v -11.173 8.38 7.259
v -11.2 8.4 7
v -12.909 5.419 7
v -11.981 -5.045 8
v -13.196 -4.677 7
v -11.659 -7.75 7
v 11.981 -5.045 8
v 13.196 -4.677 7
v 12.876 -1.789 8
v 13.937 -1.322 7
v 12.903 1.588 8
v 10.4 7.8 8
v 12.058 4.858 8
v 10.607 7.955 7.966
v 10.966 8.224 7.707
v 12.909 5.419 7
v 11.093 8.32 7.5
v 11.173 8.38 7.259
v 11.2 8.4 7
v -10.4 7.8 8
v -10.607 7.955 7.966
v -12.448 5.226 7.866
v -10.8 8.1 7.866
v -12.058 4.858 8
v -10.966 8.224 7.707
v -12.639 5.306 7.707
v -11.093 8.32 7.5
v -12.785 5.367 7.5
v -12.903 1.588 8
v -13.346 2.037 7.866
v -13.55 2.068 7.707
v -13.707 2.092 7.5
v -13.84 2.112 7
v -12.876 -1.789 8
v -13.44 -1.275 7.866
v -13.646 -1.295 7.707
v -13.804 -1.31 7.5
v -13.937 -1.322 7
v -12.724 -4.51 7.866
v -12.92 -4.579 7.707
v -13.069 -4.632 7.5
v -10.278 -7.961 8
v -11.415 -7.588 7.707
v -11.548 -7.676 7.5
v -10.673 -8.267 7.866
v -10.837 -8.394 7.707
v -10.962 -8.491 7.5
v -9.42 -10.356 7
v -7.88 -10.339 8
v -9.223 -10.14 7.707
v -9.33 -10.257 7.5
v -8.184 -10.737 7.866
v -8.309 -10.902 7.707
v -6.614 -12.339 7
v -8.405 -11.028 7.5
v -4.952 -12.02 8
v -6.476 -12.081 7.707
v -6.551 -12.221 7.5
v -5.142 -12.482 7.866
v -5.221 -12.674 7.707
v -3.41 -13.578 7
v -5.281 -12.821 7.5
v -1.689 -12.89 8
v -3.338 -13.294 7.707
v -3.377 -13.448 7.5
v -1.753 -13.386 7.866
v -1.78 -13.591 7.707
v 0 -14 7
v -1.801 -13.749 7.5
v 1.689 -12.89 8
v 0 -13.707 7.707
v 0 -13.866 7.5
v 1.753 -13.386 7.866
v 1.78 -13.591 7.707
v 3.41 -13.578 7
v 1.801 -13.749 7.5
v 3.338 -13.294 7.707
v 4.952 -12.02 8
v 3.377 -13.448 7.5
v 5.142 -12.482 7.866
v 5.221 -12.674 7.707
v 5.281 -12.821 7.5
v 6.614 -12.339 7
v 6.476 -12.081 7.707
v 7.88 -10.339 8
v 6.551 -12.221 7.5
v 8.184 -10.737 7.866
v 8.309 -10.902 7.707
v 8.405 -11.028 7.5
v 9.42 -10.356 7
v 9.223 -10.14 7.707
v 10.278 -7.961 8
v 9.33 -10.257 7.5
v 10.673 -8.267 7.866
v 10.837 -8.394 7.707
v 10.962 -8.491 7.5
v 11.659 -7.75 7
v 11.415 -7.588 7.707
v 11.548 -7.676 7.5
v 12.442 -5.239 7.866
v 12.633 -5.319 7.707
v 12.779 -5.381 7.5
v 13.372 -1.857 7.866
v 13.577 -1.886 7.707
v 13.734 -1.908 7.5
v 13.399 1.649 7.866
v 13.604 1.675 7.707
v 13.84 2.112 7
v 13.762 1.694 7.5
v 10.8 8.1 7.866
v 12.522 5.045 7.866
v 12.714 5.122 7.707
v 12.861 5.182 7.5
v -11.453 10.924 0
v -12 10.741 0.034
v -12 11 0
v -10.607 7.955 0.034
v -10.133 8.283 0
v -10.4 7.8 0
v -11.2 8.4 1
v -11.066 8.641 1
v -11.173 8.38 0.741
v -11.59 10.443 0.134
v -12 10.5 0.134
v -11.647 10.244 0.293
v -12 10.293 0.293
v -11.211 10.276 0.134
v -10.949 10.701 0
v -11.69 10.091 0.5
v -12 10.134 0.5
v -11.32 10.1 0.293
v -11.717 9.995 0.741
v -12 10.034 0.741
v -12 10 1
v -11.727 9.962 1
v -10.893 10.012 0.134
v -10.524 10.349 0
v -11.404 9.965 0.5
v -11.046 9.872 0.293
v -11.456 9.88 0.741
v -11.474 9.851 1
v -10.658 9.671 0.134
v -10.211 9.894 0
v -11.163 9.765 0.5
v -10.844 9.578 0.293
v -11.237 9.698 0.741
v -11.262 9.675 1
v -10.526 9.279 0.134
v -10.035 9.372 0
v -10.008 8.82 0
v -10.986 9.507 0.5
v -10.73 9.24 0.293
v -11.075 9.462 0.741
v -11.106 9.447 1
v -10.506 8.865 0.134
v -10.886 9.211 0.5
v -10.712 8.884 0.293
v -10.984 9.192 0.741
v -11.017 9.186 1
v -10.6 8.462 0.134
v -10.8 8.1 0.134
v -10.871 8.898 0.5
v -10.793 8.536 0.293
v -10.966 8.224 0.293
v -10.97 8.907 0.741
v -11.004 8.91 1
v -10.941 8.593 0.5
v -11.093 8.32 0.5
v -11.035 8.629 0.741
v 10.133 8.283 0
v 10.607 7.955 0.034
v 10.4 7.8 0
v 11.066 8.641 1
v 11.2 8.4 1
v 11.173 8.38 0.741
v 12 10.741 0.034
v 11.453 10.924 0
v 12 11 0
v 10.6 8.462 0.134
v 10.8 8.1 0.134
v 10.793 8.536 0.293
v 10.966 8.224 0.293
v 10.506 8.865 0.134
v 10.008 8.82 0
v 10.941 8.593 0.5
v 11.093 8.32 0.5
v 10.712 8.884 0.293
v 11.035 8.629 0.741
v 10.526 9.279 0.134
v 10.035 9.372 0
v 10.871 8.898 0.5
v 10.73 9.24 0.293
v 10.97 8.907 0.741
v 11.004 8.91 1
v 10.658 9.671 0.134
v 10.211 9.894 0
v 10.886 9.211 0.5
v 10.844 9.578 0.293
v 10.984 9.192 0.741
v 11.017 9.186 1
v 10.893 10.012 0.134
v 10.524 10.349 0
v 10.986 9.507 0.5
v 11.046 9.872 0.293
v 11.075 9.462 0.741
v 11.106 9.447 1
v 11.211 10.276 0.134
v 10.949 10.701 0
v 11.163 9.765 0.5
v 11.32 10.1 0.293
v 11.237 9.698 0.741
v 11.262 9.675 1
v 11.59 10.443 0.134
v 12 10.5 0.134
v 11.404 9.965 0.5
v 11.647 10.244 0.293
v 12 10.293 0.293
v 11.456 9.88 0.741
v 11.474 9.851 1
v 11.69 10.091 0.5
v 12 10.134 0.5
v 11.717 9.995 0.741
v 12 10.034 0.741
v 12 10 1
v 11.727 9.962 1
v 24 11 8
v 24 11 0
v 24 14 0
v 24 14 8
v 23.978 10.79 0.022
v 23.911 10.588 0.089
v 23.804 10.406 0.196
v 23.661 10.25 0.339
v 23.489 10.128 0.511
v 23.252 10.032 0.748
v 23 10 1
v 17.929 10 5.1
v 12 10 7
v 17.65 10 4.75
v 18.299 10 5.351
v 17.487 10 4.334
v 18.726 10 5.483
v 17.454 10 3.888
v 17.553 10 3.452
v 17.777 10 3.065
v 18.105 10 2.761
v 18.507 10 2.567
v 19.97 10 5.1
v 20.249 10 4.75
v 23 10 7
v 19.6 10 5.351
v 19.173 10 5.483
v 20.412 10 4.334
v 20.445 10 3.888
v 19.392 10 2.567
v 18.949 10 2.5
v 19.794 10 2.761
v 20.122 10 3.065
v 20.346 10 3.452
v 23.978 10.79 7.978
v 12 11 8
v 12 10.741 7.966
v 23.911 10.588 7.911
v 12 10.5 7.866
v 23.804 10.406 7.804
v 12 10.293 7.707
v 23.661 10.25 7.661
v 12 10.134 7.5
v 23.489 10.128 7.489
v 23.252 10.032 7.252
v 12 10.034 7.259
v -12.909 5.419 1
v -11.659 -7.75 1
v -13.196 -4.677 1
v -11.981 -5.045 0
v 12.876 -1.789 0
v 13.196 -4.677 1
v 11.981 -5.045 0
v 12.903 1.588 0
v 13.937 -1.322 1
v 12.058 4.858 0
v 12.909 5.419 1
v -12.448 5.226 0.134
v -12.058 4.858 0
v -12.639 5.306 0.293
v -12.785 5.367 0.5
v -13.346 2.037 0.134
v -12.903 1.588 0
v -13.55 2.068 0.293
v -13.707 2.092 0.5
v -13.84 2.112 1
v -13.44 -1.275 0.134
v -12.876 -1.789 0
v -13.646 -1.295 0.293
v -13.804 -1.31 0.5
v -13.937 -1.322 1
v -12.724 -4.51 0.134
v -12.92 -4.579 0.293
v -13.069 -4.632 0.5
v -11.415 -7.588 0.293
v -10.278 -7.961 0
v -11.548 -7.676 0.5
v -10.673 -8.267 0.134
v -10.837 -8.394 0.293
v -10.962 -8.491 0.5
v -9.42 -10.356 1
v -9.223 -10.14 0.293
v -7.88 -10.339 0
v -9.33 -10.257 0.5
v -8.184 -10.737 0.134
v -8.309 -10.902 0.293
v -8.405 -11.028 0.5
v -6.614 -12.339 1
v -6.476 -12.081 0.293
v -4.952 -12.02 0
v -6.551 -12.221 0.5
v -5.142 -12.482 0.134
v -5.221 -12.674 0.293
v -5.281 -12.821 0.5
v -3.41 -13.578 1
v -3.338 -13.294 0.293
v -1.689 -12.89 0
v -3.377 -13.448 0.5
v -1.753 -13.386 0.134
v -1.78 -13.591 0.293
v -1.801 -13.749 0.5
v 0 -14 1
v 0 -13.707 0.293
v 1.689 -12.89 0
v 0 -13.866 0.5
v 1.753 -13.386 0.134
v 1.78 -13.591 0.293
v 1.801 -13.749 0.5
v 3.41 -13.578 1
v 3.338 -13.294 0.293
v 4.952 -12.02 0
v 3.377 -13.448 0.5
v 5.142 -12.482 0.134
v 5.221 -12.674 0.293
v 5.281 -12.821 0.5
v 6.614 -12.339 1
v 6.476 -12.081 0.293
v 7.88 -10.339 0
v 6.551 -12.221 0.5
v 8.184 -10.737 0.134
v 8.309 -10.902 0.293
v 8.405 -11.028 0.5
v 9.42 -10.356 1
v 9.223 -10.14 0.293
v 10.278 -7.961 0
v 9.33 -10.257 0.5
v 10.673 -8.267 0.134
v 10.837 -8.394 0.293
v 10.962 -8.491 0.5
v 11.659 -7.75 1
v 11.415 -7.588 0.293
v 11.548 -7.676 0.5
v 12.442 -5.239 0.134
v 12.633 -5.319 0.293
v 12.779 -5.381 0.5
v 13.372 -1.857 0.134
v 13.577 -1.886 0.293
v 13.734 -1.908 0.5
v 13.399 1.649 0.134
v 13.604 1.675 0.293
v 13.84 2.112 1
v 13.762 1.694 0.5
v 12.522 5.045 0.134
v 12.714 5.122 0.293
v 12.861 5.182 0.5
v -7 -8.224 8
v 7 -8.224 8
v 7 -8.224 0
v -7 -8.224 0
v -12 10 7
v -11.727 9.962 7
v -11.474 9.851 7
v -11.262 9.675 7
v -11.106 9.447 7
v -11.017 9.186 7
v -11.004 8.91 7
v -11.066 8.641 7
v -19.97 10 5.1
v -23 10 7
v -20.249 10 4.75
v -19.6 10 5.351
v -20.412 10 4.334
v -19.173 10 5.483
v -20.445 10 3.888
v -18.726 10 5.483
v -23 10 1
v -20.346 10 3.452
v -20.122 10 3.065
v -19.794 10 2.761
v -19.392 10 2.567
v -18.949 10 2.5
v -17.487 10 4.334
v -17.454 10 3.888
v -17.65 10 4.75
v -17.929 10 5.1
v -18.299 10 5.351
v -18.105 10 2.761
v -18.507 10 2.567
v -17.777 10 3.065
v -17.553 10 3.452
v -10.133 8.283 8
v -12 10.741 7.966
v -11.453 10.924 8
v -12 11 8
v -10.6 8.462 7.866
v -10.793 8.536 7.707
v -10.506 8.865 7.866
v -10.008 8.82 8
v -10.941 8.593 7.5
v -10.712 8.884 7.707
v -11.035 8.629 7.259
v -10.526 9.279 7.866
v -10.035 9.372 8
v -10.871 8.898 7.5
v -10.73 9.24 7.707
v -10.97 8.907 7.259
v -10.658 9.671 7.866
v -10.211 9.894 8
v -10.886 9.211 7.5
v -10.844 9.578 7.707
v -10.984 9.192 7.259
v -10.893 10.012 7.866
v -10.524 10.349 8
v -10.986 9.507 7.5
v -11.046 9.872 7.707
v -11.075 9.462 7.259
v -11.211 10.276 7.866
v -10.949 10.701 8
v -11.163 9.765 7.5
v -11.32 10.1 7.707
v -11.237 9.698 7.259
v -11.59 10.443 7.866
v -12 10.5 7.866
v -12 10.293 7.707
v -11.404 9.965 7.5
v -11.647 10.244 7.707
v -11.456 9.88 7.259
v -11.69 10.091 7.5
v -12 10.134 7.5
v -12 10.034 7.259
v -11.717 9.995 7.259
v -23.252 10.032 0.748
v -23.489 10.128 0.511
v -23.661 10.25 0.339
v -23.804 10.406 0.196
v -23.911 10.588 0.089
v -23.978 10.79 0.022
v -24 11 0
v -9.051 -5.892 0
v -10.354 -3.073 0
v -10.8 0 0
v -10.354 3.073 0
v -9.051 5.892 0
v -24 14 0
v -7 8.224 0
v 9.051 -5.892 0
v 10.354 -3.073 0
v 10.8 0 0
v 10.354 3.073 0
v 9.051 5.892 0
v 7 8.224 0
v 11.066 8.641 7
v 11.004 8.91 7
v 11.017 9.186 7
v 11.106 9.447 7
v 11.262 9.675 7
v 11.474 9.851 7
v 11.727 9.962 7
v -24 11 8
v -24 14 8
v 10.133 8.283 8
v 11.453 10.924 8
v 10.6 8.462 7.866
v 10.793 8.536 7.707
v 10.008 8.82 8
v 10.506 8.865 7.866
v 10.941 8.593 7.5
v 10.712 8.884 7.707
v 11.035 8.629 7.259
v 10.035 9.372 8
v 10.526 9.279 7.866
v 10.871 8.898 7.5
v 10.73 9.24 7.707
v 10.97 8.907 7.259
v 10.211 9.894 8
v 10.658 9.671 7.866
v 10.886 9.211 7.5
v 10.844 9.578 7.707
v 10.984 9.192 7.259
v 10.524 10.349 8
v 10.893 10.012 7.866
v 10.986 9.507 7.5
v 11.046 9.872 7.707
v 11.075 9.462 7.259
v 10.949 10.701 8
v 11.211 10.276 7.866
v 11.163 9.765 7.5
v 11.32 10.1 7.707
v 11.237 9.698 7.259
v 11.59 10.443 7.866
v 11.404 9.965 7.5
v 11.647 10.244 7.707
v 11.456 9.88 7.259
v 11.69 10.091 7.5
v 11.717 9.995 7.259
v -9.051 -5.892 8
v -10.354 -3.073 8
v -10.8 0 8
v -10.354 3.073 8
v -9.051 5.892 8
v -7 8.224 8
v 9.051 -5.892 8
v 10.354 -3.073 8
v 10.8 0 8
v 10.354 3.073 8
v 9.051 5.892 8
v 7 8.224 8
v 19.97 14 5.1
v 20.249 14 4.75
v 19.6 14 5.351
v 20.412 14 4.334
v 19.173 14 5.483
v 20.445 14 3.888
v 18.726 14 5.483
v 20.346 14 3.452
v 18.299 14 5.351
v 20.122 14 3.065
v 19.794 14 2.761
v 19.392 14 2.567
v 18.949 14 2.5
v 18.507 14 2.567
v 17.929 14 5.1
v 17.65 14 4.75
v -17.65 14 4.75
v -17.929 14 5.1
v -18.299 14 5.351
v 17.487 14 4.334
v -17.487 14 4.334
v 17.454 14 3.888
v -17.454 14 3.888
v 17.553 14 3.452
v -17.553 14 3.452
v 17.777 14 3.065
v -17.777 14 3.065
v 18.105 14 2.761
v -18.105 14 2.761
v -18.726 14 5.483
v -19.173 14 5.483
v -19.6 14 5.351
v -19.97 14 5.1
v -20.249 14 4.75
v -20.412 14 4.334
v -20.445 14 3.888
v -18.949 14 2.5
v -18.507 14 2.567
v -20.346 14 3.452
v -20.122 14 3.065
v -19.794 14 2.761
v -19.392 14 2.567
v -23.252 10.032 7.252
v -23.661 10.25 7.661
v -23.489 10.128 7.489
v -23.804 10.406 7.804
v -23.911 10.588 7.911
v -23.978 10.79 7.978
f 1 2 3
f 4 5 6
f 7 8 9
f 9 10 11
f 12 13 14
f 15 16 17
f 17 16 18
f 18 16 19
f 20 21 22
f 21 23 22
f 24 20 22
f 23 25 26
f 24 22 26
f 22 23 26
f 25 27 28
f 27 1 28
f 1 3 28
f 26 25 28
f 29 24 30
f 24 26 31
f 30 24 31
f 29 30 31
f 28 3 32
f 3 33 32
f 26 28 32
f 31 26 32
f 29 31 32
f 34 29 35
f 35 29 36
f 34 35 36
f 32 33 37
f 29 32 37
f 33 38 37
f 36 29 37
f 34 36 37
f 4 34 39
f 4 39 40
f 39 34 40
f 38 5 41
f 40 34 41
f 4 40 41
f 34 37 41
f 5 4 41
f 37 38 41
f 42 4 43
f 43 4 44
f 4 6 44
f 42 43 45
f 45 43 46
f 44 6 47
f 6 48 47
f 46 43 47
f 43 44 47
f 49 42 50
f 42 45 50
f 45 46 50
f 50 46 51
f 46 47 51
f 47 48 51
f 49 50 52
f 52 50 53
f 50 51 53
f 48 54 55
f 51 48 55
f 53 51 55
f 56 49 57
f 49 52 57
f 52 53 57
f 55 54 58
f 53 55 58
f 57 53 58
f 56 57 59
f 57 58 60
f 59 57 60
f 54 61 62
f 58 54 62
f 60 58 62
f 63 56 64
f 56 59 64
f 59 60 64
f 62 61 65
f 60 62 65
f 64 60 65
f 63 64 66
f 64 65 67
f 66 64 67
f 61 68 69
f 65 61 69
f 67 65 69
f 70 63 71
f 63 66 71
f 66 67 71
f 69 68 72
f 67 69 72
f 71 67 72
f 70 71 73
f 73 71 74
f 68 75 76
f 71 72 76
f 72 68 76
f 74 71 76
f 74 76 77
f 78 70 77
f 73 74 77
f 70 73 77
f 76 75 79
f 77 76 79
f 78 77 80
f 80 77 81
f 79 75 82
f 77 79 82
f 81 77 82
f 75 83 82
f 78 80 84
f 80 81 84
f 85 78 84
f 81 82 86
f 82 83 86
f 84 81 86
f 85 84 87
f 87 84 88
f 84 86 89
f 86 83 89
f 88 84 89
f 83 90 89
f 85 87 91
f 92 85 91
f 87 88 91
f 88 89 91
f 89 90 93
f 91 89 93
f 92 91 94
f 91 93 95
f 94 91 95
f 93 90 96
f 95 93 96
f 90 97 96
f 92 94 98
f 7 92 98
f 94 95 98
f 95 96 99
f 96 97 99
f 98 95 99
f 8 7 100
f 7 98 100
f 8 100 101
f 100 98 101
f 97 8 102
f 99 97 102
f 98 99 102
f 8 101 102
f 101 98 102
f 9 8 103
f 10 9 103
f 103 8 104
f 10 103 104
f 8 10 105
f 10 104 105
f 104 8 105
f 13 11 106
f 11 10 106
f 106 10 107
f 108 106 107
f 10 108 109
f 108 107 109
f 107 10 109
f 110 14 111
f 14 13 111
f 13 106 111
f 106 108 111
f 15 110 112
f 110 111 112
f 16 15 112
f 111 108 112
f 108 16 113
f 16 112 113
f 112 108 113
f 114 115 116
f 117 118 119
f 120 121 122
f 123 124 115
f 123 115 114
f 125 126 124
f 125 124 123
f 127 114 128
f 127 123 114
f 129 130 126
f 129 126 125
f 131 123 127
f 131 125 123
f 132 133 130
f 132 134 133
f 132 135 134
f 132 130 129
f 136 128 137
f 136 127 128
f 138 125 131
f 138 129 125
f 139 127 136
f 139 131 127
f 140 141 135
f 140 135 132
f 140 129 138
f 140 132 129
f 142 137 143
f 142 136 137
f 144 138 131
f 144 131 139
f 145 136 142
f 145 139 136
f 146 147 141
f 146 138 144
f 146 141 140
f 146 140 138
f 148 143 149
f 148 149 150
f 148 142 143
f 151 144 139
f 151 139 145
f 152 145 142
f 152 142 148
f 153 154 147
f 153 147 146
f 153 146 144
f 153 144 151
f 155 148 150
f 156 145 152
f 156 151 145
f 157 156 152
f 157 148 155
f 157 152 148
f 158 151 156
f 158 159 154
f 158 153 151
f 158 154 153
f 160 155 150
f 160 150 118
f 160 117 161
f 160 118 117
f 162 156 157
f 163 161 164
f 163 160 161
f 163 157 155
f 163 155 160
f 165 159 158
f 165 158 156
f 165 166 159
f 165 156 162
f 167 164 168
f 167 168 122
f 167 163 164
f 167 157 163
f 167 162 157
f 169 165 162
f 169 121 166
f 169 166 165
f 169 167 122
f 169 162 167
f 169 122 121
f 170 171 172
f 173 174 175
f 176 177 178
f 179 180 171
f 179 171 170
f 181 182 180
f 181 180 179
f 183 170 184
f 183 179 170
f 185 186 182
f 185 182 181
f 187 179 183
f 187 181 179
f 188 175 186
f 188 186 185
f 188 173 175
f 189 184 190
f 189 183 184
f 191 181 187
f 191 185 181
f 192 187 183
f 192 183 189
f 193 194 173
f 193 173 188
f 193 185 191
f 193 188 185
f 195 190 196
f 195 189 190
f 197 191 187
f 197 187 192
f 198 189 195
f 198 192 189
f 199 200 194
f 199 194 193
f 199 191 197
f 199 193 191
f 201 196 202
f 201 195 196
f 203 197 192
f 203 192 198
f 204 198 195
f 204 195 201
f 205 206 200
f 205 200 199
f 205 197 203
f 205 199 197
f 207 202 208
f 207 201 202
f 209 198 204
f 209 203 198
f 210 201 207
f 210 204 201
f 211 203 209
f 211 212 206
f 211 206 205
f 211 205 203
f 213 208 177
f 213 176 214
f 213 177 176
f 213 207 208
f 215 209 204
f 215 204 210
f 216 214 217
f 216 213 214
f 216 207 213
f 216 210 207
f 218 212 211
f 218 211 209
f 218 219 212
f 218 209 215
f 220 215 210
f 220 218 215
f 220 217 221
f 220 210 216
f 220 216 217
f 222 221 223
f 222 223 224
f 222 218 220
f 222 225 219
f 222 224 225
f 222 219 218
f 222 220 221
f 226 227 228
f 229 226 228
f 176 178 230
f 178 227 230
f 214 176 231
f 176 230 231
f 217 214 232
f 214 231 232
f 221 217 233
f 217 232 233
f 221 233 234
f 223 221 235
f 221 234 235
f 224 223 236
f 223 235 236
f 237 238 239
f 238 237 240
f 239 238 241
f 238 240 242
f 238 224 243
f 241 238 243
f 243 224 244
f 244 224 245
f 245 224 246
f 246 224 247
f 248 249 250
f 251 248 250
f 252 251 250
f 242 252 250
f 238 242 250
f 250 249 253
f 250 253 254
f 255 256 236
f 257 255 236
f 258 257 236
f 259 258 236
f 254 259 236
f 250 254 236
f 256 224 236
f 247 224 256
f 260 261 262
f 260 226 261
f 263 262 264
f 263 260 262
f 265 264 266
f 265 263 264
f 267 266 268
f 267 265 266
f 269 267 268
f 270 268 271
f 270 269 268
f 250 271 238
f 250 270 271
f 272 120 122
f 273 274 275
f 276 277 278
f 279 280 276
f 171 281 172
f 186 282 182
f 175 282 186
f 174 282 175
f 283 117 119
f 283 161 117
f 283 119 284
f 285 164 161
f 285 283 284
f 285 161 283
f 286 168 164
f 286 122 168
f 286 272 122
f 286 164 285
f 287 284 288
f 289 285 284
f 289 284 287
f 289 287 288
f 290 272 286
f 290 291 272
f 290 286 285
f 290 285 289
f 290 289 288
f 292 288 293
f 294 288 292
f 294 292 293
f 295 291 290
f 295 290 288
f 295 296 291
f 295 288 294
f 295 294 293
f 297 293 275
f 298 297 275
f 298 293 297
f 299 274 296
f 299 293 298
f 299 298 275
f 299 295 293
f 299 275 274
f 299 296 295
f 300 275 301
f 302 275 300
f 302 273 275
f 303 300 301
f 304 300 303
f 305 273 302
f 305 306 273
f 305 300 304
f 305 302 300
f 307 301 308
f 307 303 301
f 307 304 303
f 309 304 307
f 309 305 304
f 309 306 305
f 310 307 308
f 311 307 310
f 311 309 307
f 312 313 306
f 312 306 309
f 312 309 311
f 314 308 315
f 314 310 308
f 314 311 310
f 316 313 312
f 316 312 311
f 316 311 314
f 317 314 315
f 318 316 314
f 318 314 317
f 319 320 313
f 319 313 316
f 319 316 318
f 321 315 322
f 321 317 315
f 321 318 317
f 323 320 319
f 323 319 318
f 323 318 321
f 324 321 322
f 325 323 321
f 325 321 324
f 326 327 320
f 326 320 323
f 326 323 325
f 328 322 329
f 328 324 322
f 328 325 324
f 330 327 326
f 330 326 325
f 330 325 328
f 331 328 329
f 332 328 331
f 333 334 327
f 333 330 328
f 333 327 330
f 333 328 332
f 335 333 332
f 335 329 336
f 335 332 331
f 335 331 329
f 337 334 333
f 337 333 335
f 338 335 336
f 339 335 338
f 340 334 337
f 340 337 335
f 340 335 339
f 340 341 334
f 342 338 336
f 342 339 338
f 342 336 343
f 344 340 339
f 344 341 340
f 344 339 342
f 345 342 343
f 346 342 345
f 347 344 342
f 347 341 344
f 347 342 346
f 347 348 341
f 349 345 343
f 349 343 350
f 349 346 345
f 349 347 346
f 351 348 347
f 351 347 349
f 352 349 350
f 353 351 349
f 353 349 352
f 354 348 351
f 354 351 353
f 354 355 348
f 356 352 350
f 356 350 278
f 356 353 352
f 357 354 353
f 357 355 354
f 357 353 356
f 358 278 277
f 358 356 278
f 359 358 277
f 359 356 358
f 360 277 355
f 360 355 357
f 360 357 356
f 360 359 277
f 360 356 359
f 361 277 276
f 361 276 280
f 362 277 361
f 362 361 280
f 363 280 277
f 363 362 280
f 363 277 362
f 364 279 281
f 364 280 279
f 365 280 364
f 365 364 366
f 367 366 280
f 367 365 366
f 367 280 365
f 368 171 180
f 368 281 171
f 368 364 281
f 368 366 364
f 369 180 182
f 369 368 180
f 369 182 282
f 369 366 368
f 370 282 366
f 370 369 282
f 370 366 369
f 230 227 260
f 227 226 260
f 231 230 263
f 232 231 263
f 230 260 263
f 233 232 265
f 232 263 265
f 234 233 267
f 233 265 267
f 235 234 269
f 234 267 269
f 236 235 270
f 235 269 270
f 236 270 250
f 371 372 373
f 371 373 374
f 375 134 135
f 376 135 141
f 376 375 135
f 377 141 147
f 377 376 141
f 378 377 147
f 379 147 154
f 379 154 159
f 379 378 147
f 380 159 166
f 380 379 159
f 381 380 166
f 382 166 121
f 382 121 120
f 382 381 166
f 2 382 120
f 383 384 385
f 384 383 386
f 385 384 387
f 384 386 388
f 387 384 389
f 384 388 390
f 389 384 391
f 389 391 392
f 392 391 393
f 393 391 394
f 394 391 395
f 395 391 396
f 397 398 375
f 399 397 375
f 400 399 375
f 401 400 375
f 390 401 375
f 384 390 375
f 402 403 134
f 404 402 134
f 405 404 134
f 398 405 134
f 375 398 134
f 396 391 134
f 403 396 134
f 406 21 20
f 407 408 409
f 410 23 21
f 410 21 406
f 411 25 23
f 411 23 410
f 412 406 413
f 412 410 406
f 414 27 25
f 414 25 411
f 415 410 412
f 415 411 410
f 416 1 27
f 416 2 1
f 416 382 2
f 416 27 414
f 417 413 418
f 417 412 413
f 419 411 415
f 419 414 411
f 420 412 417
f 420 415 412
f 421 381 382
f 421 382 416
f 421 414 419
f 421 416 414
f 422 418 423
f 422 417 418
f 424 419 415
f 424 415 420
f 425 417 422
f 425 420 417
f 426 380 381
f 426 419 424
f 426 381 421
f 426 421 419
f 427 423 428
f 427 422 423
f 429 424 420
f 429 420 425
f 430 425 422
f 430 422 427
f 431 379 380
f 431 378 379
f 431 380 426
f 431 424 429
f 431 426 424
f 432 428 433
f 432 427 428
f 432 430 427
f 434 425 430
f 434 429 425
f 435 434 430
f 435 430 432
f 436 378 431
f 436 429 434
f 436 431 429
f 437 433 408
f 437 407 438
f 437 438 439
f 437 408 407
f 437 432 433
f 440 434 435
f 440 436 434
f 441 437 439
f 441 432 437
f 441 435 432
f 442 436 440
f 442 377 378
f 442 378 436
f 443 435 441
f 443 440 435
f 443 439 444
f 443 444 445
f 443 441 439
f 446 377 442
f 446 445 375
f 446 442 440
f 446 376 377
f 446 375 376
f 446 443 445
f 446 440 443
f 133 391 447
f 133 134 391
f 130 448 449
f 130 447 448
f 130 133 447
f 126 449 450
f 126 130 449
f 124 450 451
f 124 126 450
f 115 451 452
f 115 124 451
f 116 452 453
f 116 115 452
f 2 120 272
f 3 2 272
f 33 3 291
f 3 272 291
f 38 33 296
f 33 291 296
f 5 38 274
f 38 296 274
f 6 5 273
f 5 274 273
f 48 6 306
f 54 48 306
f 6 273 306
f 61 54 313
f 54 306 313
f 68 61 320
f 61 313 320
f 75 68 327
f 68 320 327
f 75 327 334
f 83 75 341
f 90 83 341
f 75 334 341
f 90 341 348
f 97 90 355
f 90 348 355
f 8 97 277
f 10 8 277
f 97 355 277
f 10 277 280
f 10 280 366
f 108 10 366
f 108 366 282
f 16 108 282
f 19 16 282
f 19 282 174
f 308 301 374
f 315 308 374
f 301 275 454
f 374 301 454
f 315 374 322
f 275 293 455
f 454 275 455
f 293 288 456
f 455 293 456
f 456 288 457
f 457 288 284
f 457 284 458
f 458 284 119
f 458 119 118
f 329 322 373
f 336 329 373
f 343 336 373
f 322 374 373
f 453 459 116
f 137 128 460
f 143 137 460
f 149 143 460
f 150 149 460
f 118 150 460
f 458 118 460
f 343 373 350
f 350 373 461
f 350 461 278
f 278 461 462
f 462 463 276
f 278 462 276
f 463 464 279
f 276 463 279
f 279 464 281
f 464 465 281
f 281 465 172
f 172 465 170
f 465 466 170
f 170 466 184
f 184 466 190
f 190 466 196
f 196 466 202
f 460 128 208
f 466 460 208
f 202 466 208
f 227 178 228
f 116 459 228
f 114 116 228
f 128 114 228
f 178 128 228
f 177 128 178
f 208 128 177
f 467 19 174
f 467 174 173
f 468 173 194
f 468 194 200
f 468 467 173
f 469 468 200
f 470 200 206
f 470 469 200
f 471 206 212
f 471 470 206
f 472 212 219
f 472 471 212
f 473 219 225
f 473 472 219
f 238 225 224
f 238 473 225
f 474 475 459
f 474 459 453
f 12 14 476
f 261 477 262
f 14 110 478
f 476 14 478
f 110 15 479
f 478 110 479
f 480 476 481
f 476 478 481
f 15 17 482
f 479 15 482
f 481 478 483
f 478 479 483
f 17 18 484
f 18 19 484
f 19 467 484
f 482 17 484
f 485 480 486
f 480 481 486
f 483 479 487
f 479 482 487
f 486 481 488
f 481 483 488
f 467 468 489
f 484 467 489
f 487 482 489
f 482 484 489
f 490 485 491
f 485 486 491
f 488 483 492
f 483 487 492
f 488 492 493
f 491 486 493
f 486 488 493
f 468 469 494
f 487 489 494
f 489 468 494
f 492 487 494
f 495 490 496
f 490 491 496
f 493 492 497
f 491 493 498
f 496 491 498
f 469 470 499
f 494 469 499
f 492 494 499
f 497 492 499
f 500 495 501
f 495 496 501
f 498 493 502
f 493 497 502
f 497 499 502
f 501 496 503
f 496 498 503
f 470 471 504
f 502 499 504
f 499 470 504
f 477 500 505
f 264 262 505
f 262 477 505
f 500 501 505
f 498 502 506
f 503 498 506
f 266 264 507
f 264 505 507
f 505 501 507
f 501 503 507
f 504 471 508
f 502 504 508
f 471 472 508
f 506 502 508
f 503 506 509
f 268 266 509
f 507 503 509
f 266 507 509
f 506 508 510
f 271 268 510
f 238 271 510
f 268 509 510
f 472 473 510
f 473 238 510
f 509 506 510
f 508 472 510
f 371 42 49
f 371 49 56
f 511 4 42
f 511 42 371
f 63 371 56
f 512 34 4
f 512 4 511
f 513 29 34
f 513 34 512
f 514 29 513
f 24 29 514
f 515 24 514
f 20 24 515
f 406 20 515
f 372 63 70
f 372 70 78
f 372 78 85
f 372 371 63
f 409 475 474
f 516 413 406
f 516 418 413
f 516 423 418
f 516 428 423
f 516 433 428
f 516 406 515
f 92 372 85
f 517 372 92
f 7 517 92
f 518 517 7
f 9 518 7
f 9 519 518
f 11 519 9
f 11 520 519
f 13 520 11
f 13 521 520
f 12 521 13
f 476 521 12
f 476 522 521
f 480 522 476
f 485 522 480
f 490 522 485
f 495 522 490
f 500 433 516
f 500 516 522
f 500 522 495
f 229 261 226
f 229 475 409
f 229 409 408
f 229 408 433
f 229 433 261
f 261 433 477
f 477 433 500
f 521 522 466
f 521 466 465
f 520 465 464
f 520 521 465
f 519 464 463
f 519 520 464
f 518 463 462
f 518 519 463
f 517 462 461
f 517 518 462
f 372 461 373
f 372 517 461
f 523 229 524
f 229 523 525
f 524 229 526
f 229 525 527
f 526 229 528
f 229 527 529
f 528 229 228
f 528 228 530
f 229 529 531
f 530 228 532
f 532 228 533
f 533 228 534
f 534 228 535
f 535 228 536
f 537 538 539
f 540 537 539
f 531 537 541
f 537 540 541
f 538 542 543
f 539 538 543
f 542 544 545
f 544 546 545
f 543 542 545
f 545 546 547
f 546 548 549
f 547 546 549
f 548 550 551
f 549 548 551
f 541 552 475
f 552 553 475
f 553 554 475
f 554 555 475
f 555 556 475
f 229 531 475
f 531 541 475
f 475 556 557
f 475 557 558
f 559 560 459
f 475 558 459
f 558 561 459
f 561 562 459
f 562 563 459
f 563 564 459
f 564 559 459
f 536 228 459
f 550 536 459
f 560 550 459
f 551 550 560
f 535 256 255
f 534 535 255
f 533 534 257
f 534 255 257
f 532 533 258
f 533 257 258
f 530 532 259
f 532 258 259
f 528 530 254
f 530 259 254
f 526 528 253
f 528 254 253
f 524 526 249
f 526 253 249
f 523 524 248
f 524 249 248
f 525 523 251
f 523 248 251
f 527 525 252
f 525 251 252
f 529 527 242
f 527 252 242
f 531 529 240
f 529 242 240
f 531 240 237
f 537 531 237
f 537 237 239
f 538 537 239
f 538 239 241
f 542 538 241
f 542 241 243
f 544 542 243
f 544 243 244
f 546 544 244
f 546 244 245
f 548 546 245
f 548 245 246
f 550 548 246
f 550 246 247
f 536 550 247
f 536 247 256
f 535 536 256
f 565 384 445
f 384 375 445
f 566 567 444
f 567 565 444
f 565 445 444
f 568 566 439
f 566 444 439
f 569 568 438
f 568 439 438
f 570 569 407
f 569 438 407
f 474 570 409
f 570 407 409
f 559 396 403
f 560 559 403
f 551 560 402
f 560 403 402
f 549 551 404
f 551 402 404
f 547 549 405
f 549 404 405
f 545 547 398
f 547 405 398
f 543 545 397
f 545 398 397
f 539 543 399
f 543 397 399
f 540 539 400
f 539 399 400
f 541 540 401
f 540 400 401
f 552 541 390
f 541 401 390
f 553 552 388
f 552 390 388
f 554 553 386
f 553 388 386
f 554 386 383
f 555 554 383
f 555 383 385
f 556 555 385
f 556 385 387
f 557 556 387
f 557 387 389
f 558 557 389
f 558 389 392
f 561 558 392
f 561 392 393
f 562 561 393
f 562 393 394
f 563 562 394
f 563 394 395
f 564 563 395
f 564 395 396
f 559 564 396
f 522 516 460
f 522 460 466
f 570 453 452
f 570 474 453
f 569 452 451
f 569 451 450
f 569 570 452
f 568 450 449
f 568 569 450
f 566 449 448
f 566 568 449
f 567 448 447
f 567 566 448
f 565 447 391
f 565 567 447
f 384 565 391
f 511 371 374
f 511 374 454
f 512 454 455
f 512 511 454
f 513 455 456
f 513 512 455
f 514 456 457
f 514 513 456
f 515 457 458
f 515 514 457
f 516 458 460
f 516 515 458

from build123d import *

# Parameters (mm, degrees)
SALIENTE_EXTRUIR1_DEPTH = 8
CORTAR_EXTRUIR1_DEPTH   = 29.91366459
REDONDEO1_R             = 1
CROQUIS3_R              = 1.5
CORTAR_EXTRUIR2_DEPTH   = 35.871191548


with BuildPart() as part:
    # Croquis1 → Saliente-Extruir1 (new body)
    with BuildSketch(Plane.XY):
        with BuildLine():
            Line((0, 14), (-24, 14))
            Line((-24, 14), (-24, 10))
            Line((-24, 10), (-9.797958971, 10))
            ThreePointArc((-9.797958971, 10), (0, -14), (9.797958971, 10))
            Line((9.797958971, 10), (24, 10))
            Line((24, 10), (24, 14))
            Line((24, 14), (0, 14))
        make_face()
    extrude(amount=SALIENTE_EXTRUIR1_DEPTH)

    # Croquis2 → Cortar-Extruir1 (cut, through all)
    with BuildSketch(Plane.XY.offset(8)):
        with BuildLine():
            Line((-7, 8.224354078), (7, 8.224354078))
            ThreePointArc((7, 8.224354078), (10.8, 0), (7, -8.224354078))
            Line((7, -8.224354078), (-7, -8.224354078))
            ThreePointArc((-7, -8.224354078), (-10.8, 0), (-7, 8.224354078))
        make_face()
    extrude(amount=-CORTAR_EXTRUIR1_DEPTH, mode=Mode.SUBTRACT)

    # Redondeo1
    redondeo1_edges = [part.edges().sort_by_distance(p)[0] for p in [
        (16.898979486, 10, 8),
        (-24, 10, 4),
        (-9.797958971, 10, 4),
        (9.797958971, 10, 4),
        (24, 10, 4),
        (0, -14, 8),
        (-16.898979486, 10, 8),
        (-16.898979486, 10, 0),
        (0, -14, 0),
        (16.898979486, 10, 0),
    ]]
    fillet(redondeo1_edges, radius=REDONDEO1_R)

    # Croquis3 → Cortar-Extruir2 (cut, through all)
    with BuildSketch(Plane(origin=(0, 10, 0), x_dir=(-1, 0, 0), z_dir=(0, -1, 0))):
        with Locations(Location((18.949489743, -4, 0), (0, 0, 90))):
            Circle(CROQUIS3_R)
        with Locations(Location((-18.949489743, -4, 0), (0, 0, 90))):
            Circle(CROQUIS3_R)
    extrude(amount=-CORTAR_EXTRUIR2_DEPTH, mode=Mode.SUBTRACT)


solid = part.part
